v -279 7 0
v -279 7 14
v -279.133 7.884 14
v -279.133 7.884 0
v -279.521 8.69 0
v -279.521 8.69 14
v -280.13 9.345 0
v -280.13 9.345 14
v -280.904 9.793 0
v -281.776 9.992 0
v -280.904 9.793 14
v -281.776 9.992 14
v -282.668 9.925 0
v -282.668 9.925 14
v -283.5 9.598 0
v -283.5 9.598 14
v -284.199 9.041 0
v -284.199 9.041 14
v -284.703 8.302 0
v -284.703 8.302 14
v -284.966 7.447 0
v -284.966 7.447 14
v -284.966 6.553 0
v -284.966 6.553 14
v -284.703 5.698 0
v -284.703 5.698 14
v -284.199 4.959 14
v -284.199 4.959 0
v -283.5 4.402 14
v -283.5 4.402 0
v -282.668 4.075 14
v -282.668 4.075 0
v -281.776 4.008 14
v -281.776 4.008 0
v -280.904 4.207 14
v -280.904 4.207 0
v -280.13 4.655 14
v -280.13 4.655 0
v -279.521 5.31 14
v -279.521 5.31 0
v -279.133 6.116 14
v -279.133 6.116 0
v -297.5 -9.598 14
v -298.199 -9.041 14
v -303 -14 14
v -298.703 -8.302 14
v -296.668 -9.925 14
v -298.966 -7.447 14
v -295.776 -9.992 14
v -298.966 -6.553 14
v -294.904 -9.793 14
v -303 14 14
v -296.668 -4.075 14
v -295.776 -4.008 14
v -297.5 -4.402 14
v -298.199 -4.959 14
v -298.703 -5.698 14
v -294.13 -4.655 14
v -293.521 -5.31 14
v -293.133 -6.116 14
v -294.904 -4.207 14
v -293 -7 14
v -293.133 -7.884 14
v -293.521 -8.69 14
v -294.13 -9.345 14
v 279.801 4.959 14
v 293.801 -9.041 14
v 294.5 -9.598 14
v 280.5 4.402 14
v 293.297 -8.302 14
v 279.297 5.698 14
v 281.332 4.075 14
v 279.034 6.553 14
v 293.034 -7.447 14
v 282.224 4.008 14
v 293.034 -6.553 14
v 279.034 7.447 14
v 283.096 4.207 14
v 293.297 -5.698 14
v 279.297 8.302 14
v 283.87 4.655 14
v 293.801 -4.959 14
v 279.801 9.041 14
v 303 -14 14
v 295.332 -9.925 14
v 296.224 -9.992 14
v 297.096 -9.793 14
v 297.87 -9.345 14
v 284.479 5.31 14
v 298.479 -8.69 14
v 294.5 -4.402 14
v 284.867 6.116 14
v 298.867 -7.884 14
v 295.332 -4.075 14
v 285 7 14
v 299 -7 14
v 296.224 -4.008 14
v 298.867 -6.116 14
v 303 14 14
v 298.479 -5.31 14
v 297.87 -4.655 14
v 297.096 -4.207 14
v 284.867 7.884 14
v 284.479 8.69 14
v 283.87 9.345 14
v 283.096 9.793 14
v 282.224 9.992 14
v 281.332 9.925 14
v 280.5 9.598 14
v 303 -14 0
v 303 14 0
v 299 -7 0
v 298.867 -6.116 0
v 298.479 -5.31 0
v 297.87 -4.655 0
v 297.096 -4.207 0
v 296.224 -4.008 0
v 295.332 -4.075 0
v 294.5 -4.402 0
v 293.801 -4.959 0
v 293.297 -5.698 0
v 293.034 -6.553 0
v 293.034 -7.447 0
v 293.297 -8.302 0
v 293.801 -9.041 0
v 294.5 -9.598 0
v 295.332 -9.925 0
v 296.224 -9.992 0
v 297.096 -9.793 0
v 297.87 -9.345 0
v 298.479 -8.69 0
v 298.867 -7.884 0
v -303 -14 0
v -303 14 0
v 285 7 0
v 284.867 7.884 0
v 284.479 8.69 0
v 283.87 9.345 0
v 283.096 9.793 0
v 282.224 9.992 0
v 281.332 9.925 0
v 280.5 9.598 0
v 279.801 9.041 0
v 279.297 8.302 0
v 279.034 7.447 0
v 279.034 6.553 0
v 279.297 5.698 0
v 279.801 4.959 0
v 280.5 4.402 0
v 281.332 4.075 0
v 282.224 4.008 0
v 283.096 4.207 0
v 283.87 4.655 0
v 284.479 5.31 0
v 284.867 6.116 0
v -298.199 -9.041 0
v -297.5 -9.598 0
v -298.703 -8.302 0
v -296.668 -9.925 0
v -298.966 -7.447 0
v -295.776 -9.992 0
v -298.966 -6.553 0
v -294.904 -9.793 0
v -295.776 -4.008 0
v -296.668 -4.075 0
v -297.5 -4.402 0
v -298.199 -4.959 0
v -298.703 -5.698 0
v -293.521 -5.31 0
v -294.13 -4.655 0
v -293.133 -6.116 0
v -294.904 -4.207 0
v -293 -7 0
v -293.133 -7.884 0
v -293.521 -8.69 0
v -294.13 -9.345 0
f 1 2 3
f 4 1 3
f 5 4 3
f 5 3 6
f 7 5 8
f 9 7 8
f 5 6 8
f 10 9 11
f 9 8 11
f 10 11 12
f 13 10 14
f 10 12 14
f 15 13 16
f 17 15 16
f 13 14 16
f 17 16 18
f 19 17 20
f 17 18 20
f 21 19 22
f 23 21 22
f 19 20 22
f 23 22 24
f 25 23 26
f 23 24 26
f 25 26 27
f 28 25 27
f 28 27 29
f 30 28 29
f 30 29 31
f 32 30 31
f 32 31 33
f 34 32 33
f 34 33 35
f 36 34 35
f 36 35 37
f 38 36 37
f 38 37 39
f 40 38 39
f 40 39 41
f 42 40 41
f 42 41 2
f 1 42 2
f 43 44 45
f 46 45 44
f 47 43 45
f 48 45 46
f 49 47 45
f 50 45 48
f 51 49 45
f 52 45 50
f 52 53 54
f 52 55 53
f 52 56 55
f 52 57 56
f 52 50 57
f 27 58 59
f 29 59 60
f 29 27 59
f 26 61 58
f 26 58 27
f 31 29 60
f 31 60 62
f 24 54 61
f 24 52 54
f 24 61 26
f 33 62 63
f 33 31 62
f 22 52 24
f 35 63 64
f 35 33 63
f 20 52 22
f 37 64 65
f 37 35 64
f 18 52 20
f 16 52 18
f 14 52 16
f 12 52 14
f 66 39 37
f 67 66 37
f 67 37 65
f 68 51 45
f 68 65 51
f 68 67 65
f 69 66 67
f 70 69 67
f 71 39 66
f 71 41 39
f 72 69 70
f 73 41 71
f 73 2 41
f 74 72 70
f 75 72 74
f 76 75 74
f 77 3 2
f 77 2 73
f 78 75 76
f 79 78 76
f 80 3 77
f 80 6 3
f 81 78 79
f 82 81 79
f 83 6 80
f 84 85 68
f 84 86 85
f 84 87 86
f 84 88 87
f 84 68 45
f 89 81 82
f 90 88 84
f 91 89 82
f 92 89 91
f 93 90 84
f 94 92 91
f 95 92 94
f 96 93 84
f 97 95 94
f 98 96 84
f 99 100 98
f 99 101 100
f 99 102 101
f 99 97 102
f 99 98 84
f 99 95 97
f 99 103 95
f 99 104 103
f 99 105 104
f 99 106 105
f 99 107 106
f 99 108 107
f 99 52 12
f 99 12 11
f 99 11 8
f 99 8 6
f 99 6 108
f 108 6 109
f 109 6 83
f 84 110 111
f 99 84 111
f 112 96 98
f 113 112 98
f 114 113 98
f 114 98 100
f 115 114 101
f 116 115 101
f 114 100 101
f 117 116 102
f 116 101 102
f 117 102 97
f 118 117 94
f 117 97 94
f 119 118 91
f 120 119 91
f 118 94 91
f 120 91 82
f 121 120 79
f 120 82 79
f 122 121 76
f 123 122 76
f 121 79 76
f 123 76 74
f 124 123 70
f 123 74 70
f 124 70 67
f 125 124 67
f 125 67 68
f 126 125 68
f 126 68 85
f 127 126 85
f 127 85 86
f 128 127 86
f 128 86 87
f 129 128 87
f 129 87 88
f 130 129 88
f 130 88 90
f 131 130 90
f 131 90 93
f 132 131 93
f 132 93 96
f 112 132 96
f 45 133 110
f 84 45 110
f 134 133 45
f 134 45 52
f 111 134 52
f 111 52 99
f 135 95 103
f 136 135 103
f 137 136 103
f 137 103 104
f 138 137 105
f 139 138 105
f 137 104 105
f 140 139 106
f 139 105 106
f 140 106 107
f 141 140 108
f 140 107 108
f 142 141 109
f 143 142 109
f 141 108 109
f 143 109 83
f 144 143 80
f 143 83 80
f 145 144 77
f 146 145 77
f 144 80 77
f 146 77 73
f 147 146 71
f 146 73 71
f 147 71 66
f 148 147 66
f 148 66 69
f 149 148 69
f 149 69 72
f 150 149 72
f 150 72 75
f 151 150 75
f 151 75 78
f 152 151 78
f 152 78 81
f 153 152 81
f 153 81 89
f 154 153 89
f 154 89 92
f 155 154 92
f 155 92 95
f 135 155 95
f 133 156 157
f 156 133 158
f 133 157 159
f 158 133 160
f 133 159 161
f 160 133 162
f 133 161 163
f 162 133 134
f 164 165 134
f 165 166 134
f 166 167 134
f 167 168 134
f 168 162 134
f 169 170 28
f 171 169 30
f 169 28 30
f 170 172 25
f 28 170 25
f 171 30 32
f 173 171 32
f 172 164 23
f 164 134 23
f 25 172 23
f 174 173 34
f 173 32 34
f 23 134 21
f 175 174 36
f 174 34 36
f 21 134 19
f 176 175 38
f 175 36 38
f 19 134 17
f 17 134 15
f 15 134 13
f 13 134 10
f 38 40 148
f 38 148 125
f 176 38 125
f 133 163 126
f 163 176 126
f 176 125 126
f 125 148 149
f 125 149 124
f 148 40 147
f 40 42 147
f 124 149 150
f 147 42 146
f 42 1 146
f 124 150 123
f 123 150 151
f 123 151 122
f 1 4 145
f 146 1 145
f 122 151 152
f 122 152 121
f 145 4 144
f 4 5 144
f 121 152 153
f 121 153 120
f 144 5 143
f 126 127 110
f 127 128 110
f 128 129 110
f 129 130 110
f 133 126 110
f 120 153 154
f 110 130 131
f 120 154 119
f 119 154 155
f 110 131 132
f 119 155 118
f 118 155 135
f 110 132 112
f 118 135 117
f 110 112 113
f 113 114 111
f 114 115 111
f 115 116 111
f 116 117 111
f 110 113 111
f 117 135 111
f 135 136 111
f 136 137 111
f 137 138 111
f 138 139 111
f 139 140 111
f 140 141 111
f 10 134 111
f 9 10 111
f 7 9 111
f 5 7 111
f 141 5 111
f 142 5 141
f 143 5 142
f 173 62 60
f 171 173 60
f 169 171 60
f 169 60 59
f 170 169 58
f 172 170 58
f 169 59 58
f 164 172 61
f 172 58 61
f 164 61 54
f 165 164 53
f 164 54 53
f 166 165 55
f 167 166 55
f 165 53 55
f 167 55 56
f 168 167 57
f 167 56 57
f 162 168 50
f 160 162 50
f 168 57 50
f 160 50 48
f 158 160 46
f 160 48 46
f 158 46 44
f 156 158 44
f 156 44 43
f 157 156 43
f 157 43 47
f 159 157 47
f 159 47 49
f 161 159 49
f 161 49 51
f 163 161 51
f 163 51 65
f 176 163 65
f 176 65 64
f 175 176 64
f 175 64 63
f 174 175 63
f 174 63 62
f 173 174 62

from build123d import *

# Parameters (mm, degrees)
IZIM1_W                     = 606
IZIM1_H                     = 28
Y_KSEKLIK_EKSTR_ZYON1_DEPTH = 14
KES_EKSTR_ZYON1_REACH       = 16
IZIM2_R                     = 3


with BuildPart() as part:
    # Çizim1 → Yükseklik-Ekstrüzyon1 (new body)
    with BuildSketch(Plane.XY):
        Rectangle(IZIM1_W, IZIM1_H)
    extrude(amount=Y_KSEKLIK_EKSTR_ZYON1_DEPTH)

    # Çizim2 → Kes-Ekstrüzyon1 (cut, up to next)
    with BuildSketch(Plane.XY.offset(14), mode=Mode.PRIVATE) as kes_ekstr_zyon1_sk1:
        with Locations((-282, 7)):
            Circle(IZIM2_R)
    kes_ekstr_zyon1_tool1 = extrude(kes_ekstr_zyon1_sk1.sketch, amount=-KES_EKSTR_ZYON1_REACH, mode=Mode.PRIVATE) & part.part
    add(kes_ekstr_zyon1_tool1.solids().sort_by_distance((-282, 7, 14))[0], mode=Mode.SUBTRACT)
    # Çizim2 → Kes-Ekstrüzyon1 (cut, up to next)
    with BuildSketch(Plane.XY.offset(14), mode=Mode.PRIVATE) as kes_ekstr_zyon1_sk2:
        with Locations((-296, -7)):
            Circle(IZIM2_R)
    kes_ekstr_zyon1_tool2 = extrude(kes_ekstr_zyon1_sk2.sketch, amount=-KES_EKSTR_ZYON1_REACH, mode=Mode.PRIVATE) & part.part
    add(kes_ekstr_zyon1_tool2.solids().sort_by_distance((-296, -7, 14))[0], mode=Mode.SUBTRACT)
    # Çizim2 → Kes-Ekstrüzyon1 (cut, up to next)
    with BuildSketch(Plane.XY.offset(14), mode=Mode.PRIVATE) as kes_ekstr_zyon1_sk3:
        with Locations((296, -7)):
            Circle(IZIM2_R)
    kes_ekstr_zyon1_tool3 = extrude(kes_ekstr_zyon1_sk3.sketch, amount=-KES_EKSTR_ZYON1_REACH, mode=Mode.PRIVATE) & part.part
    add(kes_ekstr_zyon1_tool3.solids().sort_by_distance((296, -7, 14))[0], mode=Mode.SUBTRACT)
    # Çizim2 → Kes-Ekstrüzyon1 (cut, up to next)
    with BuildSketch(Plane.XY.offset(14), mode=Mode.PRIVATE) as kes_ekstr_zyon1_sk4:
        with Locations((282, 7)):
            Circle(IZIM2_R)
    kes_ekstr_zyon1_tool4 = extrude(kes_ekstr_zyon1_sk4.sketch, amount=-KES_EKSTR_ZYON1_REACH, mode=Mode.PRIVATE) & part.part
    add(kes_ekstr_zyon1_tool4.solids().sort_by_distance((282, 7, 14))[0], mode=Mode.SUBTRACT)


solid = part.part
